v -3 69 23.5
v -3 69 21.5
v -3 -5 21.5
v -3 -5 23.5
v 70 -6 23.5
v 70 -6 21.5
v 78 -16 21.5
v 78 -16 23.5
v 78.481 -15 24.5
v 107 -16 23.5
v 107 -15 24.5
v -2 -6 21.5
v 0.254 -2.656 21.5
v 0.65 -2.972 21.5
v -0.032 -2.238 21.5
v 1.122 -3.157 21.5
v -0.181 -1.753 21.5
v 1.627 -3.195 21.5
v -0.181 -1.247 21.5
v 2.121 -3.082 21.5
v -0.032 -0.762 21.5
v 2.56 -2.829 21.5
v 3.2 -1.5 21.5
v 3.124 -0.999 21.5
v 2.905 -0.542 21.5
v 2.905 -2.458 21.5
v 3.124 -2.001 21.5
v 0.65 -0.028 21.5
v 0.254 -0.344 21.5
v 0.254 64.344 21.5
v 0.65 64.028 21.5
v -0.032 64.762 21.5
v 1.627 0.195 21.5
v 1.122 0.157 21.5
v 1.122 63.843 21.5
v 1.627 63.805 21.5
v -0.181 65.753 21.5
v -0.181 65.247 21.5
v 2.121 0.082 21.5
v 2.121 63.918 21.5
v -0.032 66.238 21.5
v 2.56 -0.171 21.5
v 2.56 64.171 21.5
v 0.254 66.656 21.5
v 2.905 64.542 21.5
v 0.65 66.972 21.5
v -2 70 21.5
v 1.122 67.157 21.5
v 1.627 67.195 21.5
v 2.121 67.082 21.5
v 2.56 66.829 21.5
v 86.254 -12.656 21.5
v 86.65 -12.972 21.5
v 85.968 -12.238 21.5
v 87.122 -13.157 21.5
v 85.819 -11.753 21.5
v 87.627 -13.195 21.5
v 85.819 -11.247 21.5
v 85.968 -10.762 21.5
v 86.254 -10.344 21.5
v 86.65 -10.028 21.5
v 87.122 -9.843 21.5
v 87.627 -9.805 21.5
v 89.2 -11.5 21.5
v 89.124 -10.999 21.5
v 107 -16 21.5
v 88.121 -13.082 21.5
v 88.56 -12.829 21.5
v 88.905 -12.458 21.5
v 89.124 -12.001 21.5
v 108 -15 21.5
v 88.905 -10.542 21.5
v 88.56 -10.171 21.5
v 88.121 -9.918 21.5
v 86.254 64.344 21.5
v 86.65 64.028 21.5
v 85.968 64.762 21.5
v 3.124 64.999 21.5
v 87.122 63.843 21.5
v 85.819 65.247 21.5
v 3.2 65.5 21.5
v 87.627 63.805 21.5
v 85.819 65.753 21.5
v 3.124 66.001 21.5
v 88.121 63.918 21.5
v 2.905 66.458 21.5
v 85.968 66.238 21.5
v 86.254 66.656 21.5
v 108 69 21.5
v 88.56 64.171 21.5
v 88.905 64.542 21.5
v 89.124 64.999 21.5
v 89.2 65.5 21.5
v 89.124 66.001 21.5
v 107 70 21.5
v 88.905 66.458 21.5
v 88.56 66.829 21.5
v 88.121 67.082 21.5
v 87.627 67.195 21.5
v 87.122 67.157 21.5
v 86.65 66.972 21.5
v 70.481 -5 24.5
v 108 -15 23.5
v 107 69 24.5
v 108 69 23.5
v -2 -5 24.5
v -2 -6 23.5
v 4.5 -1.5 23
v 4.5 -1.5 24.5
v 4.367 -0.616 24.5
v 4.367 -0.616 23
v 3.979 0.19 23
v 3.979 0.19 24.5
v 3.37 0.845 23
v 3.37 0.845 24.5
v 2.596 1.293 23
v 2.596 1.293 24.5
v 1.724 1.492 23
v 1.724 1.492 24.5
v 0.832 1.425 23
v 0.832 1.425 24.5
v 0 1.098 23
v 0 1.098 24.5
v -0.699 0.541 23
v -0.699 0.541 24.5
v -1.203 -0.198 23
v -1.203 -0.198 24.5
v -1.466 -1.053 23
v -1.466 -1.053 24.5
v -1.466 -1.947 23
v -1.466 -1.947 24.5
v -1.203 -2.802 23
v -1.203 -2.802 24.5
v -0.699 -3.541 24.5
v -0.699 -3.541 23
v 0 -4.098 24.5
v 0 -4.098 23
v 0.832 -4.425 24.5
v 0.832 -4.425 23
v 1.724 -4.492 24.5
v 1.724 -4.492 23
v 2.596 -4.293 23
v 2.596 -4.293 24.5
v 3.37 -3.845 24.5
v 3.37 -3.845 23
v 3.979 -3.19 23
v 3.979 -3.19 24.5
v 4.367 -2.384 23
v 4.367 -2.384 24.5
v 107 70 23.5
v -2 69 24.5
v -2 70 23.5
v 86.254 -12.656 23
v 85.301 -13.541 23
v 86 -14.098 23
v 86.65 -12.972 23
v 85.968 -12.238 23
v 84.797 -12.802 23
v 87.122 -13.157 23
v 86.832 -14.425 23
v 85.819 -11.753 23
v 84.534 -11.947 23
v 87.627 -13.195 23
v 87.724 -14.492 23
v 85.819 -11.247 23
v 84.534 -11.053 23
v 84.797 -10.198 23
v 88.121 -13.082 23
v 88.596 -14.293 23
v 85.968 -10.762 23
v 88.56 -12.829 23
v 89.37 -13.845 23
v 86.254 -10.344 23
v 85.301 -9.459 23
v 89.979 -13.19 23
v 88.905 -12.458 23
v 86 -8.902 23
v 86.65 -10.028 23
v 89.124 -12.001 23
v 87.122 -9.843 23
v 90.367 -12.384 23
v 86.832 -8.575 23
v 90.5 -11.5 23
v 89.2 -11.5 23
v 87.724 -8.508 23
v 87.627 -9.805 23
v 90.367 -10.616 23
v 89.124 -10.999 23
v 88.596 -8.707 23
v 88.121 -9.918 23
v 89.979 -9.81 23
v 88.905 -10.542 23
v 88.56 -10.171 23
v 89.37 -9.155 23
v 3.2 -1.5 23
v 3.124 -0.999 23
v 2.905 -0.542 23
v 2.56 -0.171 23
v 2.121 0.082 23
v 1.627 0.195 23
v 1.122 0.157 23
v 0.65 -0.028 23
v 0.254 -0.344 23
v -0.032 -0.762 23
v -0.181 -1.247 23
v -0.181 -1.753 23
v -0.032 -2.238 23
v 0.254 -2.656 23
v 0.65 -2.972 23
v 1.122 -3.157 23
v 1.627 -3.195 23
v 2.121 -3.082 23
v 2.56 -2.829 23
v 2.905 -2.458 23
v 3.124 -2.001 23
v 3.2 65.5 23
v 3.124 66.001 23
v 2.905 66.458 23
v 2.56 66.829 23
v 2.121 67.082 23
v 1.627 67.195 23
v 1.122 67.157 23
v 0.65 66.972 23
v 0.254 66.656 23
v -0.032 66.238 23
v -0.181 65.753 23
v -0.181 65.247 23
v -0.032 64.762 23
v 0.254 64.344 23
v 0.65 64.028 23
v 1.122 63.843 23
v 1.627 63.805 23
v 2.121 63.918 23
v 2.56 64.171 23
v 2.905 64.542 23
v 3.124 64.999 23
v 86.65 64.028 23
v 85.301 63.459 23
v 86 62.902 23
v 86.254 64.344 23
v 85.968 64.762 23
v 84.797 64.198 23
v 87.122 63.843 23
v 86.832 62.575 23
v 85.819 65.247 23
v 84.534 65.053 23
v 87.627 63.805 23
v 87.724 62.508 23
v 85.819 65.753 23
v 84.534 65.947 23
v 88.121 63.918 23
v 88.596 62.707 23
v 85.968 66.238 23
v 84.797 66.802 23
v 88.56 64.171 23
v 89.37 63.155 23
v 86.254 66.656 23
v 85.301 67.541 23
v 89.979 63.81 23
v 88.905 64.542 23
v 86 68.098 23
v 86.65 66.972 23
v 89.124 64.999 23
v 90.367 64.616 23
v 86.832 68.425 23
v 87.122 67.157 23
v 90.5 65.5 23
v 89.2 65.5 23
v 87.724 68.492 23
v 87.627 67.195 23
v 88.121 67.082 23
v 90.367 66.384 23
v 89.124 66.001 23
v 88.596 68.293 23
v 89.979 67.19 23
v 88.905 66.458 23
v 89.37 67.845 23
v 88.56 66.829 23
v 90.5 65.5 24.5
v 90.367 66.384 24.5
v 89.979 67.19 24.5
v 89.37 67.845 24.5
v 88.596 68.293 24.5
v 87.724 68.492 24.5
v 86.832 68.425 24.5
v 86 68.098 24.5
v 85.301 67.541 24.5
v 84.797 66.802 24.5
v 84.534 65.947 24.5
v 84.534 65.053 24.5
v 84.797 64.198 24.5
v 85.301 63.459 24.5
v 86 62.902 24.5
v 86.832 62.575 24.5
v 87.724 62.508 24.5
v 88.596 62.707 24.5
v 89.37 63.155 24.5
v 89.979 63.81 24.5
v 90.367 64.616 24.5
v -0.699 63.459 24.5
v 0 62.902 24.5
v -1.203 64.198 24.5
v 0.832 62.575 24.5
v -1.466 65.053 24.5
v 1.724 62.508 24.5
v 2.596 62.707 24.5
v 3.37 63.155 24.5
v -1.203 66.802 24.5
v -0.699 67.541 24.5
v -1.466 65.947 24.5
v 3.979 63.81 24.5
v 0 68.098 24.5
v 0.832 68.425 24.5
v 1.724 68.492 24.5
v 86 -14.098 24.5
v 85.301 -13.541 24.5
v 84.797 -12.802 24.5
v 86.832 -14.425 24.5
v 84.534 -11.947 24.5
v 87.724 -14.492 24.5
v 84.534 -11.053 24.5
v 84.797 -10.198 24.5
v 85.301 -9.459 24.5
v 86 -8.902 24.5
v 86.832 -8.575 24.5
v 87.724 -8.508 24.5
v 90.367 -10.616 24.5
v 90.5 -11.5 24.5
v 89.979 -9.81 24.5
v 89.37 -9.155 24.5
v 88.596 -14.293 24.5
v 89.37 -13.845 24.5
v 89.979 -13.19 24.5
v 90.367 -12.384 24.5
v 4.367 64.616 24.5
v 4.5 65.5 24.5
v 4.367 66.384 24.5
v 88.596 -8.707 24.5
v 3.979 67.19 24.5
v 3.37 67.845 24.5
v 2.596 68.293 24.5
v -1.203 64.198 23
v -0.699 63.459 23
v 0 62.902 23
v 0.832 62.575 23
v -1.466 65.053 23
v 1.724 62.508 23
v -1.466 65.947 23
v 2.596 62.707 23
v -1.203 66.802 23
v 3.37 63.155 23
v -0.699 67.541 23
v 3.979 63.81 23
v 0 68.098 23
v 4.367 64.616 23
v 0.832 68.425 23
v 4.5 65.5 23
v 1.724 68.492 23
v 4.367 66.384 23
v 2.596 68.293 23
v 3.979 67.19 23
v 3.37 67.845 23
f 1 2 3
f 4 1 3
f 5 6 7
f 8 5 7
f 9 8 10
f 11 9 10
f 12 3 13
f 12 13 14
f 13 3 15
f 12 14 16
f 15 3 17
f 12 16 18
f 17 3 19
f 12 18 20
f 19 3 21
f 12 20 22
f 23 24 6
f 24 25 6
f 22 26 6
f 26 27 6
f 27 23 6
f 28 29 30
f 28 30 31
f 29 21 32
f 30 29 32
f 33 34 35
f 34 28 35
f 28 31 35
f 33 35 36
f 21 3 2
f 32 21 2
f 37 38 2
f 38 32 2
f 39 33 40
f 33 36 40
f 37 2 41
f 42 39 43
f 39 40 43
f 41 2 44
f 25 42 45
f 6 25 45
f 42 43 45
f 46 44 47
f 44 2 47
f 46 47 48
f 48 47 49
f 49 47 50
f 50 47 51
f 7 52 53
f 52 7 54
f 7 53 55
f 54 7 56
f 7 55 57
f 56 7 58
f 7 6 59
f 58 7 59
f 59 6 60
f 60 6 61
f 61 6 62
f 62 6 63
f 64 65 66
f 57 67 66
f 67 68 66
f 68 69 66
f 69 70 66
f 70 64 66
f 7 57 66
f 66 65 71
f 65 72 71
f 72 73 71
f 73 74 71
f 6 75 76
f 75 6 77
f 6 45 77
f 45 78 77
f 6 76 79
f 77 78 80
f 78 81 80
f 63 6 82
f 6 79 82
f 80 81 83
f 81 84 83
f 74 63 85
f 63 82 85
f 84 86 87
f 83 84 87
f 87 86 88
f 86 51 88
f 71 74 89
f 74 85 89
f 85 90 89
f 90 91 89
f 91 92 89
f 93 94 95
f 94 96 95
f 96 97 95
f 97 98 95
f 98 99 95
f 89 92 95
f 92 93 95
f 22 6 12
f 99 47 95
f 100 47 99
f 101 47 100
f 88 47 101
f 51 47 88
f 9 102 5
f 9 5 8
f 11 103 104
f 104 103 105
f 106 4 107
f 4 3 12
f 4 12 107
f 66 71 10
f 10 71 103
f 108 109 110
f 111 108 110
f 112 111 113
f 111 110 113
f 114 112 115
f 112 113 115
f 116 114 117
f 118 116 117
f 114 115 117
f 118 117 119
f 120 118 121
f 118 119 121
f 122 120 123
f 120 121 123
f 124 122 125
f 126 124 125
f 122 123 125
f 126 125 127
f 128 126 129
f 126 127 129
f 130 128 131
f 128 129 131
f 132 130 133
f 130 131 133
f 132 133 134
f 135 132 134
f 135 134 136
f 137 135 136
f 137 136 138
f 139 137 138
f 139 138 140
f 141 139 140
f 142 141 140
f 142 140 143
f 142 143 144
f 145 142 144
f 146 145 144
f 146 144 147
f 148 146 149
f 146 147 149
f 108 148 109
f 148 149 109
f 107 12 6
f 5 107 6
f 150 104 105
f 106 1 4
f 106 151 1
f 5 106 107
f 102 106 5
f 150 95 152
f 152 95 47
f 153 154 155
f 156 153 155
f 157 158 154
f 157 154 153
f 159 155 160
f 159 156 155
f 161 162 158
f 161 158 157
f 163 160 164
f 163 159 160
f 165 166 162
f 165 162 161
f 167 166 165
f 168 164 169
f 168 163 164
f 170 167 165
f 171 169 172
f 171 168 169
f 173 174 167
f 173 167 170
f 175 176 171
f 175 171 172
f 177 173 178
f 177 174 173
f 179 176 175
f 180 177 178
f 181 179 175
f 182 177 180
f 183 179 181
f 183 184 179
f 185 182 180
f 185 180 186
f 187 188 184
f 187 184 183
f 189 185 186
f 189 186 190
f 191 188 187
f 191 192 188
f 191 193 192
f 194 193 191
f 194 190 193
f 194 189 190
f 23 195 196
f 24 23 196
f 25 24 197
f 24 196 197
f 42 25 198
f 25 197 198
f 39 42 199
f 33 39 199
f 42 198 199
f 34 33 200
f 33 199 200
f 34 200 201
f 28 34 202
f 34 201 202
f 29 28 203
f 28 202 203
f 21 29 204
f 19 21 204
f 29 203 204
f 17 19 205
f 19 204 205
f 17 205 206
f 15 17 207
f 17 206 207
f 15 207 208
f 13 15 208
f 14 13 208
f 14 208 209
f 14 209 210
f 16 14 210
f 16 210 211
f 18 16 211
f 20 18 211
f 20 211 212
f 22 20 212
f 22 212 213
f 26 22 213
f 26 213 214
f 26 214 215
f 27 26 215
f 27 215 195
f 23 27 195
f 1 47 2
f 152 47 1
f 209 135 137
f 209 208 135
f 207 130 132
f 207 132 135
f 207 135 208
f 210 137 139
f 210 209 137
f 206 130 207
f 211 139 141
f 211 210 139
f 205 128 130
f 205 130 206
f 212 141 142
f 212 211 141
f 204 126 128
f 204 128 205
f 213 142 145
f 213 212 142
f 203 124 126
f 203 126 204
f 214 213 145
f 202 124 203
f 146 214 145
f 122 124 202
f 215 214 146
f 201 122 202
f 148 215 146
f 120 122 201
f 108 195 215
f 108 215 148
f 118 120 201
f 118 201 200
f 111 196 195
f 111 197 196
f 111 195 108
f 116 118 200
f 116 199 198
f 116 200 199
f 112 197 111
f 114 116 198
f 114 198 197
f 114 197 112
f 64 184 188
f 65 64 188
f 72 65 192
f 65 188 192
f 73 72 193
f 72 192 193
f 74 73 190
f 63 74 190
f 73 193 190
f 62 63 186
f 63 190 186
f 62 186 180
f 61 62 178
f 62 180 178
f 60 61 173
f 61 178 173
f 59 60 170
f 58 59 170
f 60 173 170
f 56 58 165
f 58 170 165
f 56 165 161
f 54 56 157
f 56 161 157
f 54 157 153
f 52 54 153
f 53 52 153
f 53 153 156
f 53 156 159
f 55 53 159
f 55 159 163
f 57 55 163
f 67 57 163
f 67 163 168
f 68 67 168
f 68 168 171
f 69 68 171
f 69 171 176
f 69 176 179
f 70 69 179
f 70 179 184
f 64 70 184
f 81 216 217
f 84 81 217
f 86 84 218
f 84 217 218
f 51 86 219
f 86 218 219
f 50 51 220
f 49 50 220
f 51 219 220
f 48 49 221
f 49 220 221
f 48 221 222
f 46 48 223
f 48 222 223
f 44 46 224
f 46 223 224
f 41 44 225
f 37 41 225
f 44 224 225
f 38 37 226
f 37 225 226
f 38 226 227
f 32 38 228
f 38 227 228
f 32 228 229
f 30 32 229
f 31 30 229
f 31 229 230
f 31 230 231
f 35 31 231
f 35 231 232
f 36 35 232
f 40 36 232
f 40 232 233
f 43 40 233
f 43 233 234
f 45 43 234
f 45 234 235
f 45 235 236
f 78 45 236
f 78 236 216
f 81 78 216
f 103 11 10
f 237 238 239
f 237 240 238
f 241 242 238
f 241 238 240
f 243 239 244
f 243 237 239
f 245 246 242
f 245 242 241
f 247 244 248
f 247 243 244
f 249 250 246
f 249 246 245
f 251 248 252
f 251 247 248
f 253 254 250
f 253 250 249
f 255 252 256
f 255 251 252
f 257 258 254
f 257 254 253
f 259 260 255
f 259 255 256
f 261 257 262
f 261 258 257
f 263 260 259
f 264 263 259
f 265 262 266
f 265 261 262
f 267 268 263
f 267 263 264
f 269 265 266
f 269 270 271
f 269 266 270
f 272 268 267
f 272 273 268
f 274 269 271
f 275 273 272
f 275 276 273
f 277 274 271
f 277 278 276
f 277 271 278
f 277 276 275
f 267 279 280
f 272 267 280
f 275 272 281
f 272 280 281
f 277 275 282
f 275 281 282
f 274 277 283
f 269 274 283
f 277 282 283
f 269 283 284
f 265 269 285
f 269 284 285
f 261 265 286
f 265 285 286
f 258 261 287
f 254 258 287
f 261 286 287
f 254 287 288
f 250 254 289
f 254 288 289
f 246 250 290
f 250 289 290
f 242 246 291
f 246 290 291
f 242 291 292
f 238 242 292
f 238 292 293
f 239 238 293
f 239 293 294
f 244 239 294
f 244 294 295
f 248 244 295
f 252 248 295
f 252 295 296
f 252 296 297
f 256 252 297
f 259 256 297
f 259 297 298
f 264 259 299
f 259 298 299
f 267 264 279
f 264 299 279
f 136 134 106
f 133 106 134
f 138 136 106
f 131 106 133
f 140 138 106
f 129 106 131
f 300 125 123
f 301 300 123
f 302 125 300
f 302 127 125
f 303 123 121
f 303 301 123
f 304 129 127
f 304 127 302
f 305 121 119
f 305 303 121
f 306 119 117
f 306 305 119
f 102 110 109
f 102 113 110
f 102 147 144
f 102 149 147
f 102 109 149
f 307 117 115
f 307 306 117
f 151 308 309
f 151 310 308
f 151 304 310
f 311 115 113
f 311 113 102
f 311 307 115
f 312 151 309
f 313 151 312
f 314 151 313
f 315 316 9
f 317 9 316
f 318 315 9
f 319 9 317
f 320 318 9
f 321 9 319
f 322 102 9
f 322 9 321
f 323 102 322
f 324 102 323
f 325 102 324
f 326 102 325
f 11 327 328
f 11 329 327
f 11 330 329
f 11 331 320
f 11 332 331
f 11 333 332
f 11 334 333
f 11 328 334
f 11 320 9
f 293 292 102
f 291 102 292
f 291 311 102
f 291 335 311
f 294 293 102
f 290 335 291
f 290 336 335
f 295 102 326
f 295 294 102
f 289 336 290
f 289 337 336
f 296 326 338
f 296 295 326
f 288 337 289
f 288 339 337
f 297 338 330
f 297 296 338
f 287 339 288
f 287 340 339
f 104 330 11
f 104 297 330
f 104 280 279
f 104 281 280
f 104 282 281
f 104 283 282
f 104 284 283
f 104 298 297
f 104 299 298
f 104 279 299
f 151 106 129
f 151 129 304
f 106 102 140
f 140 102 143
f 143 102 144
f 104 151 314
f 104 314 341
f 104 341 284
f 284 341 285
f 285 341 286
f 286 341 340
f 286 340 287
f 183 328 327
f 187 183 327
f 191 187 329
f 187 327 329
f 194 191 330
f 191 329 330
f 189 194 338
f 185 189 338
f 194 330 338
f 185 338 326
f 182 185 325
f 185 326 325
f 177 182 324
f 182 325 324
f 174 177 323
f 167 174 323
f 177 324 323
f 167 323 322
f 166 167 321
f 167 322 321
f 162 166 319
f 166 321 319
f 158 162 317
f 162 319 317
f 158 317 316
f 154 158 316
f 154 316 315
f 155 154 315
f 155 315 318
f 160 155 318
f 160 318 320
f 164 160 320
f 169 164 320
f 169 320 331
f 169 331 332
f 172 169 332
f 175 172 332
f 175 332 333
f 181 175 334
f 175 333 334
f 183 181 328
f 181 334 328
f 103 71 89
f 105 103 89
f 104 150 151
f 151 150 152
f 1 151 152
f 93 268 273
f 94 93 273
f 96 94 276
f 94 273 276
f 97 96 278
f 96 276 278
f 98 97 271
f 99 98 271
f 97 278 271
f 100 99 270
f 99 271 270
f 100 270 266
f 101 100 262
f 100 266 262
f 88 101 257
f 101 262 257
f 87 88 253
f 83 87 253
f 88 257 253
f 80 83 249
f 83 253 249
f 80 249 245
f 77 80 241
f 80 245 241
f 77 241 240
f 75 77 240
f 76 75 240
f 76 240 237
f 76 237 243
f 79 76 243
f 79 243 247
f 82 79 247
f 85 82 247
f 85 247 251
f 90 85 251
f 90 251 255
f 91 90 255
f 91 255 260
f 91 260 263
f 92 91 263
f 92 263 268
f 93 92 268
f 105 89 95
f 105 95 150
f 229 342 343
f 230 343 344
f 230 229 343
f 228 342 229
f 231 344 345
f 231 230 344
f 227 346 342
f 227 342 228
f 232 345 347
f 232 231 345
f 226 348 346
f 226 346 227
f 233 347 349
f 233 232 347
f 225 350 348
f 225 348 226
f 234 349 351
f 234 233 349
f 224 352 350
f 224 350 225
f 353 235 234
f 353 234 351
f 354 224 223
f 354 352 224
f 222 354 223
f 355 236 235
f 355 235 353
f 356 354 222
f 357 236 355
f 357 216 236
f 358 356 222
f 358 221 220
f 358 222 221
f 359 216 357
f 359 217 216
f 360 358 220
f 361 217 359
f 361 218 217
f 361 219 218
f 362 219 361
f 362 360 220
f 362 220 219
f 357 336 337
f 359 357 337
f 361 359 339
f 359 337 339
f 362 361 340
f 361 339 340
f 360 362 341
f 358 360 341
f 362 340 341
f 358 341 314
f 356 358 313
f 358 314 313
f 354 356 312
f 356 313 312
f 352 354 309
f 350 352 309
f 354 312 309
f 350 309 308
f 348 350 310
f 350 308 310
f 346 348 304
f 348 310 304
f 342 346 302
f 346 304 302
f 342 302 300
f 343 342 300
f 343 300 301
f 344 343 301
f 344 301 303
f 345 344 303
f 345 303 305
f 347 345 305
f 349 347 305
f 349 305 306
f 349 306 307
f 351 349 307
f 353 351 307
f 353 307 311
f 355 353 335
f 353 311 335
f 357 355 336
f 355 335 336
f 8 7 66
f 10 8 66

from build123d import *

# Parameters (mm, degrees)
PAD010_DEPTH    = 3
SKETCH023_R     = 1.7
HOLE002_DEPTH   = 3
HOLE002_TIPS_R  = 1.7
SKETCH024_R     = 3
POCKET007_DEPTH = 1.5
CHAMFER001_SIZE = 1


with BuildPart() as part:
    # Sketch022 (on Face1 of CopyPad011) → Pad010 (new body)
    with BuildSketch(Plane.XY.offset(24)):
        Polygon((-3, -6), (70, -6), (78, -16), (108, -16), (108, 70), (-3, 70), align=None)
    extrude(amount=PAD010_DEPTH)

    # Sketch023 (on Face8 of Pad010) → Hole002 (cut)
    with BuildSketch(Plane.XY.offset(27)):
        with Locations((1.5, 65.5)):
            Circle(SKETCH023_R)
        with Locations((87.5, 65.5)):
            Circle(SKETCH023_R)
        with Locations((87.5, -11.5)):
            Circle(SKETCH023_R)
        with Locations((1.5, -1.5)):
            Circle(SKETCH023_R)
    extrude(amount=-HOLE002_DEPTH, mode=Mode.SUBTRACT)

    # Hole002 tips → Hole002 tip 1 section 0
    with BuildSketch(Plane.XY.offset(24), mode=Mode.PRIVATE) as hole002_tip_1_s0:
        with Locations((1.5, 65.5)):
            Circle(HOLE002_TIPS_R)
    loft([hole002_tip_1_s0.sketch, Vertex(1.5, 65.5, 22.978537)], mode=Mode.SUBTRACT)

    # Hole002 tips → Hole002 tip 2 section 0
    with BuildSketch(Plane.XY.offset(24), mode=Mode.PRIVATE) as hole002_tip_2_s0:
        with Locations((87.5, 65.5)):
            Circle(HOLE002_TIPS_R)
    loft([hole002_tip_2_s0.sketch, Vertex(87.5, 65.5, 22.978537)], mode=Mode.SUBTRACT)

    # Hole002 tips → Hole002 tip 3 section 0
    with BuildSketch(Plane.XY.offset(24), mode=Mode.PRIVATE) as hole002_tip_3_s0:
        with Locations((87.5, -11.5)):
            Circle(HOLE002_TIPS_R)
    loft([hole002_tip_3_s0.sketch, Vertex(87.5, -11.5, 22.978537)], mode=Mode.SUBTRACT)

    # Hole002 tips → Hole002 tip 4 section 0
    with BuildSketch(Plane.XY.offset(24), mode=Mode.PRIVATE) as hole002_tip_4_s0:
        with Locations((1.5, -1.5)):
            Circle(HOLE002_TIPS_R)
    loft([hole002_tip_4_s0.sketch, Vertex(1.5, -1.5, 22.978537)], mode=Mode.SUBTRACT)

    # Sketch024 (on Face5 of Hole002) → Pocket007 (cut)
    with BuildSketch(Plane.XY.offset(27)):
        with Locations((1.5, 65.5)):
            Circle(SKETCH024_R)
        with Locations((87.5, 65.5)):
            Circle(SKETCH024_R)
        with Locations((87.5, -11.5)):
            Circle(SKETCH024_R)
        with Locations((1.5, -1.5)):
            Circle(SKETCH024_R)
    extrude(amount=-POCKET007_DEPTH, mode=Mode.SUBTRACT)

    # Chamfer001
    chamfer001_edges = [part.edges().sort_by_distance(p)[0] for p in [
        (-3, -6, 25.5),
        (-3, 32, 27),
        (33.5, -6, 27),
        (93, -16, 27),
        (74, -11, 27),
        (108, 27, 27),
        (52.5, 70, 27),
        (108, -16, 25.5),
        (108, 70, 25.5),
        (-3, 70, 25.5),
    ]]
    chamfer(chamfer001_edges, length=CHAMFER001_SIZE)


with BuildPart() as part_1:
    # Body002 placement: moved
    add(part.part.moved(Location((0, 0, -2.5))))


solid = part_1.part
